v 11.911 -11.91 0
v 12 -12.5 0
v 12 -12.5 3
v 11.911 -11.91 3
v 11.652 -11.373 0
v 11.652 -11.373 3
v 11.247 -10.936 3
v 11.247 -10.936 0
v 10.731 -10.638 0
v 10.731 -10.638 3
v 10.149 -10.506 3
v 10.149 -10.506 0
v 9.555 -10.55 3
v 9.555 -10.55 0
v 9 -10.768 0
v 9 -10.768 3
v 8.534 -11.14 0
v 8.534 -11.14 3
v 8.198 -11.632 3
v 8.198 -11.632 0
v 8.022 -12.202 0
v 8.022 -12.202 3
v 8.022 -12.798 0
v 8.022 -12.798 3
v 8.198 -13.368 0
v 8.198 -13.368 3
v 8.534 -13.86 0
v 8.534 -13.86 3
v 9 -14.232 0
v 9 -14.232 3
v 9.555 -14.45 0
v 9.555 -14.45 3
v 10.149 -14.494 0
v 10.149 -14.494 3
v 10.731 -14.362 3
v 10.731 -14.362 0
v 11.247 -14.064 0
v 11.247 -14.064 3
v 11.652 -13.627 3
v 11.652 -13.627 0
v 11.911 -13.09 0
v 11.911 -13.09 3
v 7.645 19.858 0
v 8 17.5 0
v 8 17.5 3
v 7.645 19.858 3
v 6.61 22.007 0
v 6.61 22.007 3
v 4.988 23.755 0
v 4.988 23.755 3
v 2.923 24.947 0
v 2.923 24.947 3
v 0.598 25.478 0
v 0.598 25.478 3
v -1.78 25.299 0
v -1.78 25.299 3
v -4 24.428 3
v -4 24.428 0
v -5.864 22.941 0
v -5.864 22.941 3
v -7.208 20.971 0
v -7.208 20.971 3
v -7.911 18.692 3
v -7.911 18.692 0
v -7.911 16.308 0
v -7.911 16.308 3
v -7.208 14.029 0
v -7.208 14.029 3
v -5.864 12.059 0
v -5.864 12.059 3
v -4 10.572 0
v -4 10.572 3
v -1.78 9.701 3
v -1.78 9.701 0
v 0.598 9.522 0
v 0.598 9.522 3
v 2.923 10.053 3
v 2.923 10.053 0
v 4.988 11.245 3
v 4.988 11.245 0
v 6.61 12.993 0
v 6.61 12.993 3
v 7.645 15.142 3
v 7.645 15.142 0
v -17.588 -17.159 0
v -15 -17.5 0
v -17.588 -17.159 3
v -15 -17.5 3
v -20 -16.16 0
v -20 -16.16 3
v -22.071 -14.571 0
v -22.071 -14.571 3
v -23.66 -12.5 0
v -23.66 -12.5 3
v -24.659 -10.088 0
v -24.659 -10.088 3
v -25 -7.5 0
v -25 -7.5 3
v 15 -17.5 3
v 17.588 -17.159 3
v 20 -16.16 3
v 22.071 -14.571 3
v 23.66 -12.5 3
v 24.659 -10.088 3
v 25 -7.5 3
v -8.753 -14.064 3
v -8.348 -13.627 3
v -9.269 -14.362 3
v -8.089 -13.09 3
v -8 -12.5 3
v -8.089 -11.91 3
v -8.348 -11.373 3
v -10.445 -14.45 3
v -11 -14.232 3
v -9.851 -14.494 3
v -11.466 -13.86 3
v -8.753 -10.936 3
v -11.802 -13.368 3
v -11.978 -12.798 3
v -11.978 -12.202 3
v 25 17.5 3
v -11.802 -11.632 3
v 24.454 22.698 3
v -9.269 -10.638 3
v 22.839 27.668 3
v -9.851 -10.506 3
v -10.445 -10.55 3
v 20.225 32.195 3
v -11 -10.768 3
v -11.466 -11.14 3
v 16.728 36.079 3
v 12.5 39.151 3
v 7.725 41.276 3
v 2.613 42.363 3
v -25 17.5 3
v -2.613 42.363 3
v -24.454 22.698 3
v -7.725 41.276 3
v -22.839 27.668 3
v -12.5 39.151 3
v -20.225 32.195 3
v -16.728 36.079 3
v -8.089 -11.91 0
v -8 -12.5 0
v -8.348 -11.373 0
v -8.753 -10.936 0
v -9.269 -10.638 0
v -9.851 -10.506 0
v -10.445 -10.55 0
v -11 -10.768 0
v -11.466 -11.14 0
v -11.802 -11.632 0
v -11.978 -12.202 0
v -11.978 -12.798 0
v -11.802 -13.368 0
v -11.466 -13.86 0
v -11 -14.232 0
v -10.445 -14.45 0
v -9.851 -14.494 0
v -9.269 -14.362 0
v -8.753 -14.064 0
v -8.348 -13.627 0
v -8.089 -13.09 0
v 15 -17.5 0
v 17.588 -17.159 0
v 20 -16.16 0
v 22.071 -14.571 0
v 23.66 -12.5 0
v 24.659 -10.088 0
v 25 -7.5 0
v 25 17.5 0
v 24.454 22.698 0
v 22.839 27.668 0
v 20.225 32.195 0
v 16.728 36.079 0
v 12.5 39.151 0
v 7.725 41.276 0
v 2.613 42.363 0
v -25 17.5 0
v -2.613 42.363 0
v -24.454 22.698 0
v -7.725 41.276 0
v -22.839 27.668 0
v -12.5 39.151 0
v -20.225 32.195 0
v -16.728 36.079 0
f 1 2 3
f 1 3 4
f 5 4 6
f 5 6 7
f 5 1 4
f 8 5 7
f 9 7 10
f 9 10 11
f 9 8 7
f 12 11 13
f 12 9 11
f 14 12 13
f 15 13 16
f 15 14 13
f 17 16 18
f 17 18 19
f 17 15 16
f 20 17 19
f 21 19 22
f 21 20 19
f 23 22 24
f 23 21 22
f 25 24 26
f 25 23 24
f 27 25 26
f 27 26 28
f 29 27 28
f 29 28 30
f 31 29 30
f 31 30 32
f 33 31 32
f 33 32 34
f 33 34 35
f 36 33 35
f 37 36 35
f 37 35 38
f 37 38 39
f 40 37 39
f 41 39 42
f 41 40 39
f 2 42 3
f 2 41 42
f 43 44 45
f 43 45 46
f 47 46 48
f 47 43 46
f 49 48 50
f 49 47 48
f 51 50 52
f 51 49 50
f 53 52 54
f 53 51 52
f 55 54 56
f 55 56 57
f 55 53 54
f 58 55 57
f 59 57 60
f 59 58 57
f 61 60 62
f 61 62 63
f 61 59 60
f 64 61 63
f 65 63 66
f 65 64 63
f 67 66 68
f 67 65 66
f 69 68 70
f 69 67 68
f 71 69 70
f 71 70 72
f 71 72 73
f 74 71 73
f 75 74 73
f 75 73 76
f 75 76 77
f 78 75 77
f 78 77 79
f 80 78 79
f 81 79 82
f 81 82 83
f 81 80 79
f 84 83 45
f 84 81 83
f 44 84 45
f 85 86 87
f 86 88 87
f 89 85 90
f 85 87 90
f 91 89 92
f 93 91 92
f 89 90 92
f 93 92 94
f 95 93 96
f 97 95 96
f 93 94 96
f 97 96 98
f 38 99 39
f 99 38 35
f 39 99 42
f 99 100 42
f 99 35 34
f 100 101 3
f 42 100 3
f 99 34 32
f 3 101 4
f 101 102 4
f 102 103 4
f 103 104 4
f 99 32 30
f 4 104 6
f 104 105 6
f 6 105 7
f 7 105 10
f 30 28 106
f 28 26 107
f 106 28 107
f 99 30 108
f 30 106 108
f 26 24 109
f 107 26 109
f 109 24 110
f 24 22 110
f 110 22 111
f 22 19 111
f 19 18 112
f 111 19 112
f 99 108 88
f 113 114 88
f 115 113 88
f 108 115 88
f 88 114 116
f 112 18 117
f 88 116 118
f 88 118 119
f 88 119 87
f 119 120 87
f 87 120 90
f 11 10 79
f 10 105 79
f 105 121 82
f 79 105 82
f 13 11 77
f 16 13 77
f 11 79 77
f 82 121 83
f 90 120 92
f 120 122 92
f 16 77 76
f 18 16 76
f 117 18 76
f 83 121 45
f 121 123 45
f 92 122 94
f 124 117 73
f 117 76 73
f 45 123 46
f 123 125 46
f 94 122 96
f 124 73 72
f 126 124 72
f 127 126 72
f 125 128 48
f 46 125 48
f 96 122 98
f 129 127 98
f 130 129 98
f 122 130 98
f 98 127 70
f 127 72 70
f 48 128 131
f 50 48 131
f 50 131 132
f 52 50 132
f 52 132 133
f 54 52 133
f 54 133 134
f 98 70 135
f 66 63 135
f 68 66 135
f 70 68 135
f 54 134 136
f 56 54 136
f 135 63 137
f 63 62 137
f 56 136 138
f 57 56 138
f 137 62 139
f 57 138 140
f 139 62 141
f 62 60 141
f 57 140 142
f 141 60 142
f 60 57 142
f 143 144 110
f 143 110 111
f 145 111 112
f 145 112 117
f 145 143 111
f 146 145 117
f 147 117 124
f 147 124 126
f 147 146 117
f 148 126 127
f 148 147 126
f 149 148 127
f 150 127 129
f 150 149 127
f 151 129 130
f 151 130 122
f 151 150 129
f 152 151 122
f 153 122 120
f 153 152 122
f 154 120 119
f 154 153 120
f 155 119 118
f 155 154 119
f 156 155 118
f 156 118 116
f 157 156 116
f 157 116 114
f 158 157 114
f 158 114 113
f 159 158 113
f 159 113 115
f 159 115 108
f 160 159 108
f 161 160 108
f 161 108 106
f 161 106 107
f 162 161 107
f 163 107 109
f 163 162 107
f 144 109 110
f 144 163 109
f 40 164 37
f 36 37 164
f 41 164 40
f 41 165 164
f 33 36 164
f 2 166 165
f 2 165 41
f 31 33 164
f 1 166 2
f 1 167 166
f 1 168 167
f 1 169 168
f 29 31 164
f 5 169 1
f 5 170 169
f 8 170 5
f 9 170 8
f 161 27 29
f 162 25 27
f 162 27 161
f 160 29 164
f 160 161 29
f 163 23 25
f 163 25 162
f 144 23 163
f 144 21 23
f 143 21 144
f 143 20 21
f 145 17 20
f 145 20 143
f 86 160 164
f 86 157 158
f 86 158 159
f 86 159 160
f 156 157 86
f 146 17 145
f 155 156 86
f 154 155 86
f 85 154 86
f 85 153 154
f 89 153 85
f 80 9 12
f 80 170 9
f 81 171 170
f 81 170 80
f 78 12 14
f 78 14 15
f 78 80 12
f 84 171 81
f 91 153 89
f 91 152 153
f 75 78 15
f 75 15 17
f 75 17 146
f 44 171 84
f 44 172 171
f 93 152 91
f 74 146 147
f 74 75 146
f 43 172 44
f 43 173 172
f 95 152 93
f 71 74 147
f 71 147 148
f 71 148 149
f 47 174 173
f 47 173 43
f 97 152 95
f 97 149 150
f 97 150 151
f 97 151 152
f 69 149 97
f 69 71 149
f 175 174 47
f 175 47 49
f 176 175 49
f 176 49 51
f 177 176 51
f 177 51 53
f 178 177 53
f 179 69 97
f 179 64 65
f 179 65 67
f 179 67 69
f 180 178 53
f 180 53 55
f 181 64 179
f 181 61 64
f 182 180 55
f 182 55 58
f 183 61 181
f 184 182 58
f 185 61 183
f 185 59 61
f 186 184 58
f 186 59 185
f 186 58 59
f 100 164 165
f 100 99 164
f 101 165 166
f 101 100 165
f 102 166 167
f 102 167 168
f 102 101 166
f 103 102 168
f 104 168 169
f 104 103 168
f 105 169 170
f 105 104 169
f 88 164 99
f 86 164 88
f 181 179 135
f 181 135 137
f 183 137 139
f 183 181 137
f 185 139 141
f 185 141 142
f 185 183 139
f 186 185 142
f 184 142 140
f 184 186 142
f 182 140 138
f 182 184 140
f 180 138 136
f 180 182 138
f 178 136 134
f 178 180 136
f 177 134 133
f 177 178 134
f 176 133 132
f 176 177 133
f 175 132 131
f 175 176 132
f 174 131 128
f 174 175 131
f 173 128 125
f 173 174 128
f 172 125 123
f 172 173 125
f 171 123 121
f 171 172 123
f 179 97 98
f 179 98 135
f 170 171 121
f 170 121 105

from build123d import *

# Parameters (mm, degrees)
SKETCH_1_R      = 8
SKETCH_1_R_2    = 2
EXTRUDE_1_DEPTH = 3
FILLET_1_R      = 10


with BuildPart() as part:
    # ｽｹｯﾁ1 → ﾎﾞｽ - 押し出し1 (new body)
    with BuildSketch(Plane.XY):
        with BuildLine():
            Line((25, -17.5), (-25, -17.5))
            Line((-25, -17.5), (-25, 17.5))
            ThreePointArc((-25, 17.5), (0, 42.5), (25, 17.5))
            Line((25, 17.5), (25, -17.5))
        make_face()
        with Locations((0, 17.5)):
            Circle(SKETCH_1_R, mode=Mode.SUBTRACT)
        with Locations((-10, -12.5)):
            Circle(SKETCH_1_R_2, mode=Mode.SUBTRACT)
        with Locations((10, -12.5)):
            Circle(SKETCH_1_R_2, mode=Mode.SUBTRACT)
    extrude(amount=EXTRUDE_1_DEPTH)

    # ﾌｨﾚｯﾄ1
    fillet_1_edges = [part.edges().sort_by_distance(p)[0] for p in [
        (25, -17.5, 1.5),
        (-25, -17.5, 1.5),
    ]]
    fillet(fillet_1_edges, radius=FILLET_1_R)


solid = part.part
